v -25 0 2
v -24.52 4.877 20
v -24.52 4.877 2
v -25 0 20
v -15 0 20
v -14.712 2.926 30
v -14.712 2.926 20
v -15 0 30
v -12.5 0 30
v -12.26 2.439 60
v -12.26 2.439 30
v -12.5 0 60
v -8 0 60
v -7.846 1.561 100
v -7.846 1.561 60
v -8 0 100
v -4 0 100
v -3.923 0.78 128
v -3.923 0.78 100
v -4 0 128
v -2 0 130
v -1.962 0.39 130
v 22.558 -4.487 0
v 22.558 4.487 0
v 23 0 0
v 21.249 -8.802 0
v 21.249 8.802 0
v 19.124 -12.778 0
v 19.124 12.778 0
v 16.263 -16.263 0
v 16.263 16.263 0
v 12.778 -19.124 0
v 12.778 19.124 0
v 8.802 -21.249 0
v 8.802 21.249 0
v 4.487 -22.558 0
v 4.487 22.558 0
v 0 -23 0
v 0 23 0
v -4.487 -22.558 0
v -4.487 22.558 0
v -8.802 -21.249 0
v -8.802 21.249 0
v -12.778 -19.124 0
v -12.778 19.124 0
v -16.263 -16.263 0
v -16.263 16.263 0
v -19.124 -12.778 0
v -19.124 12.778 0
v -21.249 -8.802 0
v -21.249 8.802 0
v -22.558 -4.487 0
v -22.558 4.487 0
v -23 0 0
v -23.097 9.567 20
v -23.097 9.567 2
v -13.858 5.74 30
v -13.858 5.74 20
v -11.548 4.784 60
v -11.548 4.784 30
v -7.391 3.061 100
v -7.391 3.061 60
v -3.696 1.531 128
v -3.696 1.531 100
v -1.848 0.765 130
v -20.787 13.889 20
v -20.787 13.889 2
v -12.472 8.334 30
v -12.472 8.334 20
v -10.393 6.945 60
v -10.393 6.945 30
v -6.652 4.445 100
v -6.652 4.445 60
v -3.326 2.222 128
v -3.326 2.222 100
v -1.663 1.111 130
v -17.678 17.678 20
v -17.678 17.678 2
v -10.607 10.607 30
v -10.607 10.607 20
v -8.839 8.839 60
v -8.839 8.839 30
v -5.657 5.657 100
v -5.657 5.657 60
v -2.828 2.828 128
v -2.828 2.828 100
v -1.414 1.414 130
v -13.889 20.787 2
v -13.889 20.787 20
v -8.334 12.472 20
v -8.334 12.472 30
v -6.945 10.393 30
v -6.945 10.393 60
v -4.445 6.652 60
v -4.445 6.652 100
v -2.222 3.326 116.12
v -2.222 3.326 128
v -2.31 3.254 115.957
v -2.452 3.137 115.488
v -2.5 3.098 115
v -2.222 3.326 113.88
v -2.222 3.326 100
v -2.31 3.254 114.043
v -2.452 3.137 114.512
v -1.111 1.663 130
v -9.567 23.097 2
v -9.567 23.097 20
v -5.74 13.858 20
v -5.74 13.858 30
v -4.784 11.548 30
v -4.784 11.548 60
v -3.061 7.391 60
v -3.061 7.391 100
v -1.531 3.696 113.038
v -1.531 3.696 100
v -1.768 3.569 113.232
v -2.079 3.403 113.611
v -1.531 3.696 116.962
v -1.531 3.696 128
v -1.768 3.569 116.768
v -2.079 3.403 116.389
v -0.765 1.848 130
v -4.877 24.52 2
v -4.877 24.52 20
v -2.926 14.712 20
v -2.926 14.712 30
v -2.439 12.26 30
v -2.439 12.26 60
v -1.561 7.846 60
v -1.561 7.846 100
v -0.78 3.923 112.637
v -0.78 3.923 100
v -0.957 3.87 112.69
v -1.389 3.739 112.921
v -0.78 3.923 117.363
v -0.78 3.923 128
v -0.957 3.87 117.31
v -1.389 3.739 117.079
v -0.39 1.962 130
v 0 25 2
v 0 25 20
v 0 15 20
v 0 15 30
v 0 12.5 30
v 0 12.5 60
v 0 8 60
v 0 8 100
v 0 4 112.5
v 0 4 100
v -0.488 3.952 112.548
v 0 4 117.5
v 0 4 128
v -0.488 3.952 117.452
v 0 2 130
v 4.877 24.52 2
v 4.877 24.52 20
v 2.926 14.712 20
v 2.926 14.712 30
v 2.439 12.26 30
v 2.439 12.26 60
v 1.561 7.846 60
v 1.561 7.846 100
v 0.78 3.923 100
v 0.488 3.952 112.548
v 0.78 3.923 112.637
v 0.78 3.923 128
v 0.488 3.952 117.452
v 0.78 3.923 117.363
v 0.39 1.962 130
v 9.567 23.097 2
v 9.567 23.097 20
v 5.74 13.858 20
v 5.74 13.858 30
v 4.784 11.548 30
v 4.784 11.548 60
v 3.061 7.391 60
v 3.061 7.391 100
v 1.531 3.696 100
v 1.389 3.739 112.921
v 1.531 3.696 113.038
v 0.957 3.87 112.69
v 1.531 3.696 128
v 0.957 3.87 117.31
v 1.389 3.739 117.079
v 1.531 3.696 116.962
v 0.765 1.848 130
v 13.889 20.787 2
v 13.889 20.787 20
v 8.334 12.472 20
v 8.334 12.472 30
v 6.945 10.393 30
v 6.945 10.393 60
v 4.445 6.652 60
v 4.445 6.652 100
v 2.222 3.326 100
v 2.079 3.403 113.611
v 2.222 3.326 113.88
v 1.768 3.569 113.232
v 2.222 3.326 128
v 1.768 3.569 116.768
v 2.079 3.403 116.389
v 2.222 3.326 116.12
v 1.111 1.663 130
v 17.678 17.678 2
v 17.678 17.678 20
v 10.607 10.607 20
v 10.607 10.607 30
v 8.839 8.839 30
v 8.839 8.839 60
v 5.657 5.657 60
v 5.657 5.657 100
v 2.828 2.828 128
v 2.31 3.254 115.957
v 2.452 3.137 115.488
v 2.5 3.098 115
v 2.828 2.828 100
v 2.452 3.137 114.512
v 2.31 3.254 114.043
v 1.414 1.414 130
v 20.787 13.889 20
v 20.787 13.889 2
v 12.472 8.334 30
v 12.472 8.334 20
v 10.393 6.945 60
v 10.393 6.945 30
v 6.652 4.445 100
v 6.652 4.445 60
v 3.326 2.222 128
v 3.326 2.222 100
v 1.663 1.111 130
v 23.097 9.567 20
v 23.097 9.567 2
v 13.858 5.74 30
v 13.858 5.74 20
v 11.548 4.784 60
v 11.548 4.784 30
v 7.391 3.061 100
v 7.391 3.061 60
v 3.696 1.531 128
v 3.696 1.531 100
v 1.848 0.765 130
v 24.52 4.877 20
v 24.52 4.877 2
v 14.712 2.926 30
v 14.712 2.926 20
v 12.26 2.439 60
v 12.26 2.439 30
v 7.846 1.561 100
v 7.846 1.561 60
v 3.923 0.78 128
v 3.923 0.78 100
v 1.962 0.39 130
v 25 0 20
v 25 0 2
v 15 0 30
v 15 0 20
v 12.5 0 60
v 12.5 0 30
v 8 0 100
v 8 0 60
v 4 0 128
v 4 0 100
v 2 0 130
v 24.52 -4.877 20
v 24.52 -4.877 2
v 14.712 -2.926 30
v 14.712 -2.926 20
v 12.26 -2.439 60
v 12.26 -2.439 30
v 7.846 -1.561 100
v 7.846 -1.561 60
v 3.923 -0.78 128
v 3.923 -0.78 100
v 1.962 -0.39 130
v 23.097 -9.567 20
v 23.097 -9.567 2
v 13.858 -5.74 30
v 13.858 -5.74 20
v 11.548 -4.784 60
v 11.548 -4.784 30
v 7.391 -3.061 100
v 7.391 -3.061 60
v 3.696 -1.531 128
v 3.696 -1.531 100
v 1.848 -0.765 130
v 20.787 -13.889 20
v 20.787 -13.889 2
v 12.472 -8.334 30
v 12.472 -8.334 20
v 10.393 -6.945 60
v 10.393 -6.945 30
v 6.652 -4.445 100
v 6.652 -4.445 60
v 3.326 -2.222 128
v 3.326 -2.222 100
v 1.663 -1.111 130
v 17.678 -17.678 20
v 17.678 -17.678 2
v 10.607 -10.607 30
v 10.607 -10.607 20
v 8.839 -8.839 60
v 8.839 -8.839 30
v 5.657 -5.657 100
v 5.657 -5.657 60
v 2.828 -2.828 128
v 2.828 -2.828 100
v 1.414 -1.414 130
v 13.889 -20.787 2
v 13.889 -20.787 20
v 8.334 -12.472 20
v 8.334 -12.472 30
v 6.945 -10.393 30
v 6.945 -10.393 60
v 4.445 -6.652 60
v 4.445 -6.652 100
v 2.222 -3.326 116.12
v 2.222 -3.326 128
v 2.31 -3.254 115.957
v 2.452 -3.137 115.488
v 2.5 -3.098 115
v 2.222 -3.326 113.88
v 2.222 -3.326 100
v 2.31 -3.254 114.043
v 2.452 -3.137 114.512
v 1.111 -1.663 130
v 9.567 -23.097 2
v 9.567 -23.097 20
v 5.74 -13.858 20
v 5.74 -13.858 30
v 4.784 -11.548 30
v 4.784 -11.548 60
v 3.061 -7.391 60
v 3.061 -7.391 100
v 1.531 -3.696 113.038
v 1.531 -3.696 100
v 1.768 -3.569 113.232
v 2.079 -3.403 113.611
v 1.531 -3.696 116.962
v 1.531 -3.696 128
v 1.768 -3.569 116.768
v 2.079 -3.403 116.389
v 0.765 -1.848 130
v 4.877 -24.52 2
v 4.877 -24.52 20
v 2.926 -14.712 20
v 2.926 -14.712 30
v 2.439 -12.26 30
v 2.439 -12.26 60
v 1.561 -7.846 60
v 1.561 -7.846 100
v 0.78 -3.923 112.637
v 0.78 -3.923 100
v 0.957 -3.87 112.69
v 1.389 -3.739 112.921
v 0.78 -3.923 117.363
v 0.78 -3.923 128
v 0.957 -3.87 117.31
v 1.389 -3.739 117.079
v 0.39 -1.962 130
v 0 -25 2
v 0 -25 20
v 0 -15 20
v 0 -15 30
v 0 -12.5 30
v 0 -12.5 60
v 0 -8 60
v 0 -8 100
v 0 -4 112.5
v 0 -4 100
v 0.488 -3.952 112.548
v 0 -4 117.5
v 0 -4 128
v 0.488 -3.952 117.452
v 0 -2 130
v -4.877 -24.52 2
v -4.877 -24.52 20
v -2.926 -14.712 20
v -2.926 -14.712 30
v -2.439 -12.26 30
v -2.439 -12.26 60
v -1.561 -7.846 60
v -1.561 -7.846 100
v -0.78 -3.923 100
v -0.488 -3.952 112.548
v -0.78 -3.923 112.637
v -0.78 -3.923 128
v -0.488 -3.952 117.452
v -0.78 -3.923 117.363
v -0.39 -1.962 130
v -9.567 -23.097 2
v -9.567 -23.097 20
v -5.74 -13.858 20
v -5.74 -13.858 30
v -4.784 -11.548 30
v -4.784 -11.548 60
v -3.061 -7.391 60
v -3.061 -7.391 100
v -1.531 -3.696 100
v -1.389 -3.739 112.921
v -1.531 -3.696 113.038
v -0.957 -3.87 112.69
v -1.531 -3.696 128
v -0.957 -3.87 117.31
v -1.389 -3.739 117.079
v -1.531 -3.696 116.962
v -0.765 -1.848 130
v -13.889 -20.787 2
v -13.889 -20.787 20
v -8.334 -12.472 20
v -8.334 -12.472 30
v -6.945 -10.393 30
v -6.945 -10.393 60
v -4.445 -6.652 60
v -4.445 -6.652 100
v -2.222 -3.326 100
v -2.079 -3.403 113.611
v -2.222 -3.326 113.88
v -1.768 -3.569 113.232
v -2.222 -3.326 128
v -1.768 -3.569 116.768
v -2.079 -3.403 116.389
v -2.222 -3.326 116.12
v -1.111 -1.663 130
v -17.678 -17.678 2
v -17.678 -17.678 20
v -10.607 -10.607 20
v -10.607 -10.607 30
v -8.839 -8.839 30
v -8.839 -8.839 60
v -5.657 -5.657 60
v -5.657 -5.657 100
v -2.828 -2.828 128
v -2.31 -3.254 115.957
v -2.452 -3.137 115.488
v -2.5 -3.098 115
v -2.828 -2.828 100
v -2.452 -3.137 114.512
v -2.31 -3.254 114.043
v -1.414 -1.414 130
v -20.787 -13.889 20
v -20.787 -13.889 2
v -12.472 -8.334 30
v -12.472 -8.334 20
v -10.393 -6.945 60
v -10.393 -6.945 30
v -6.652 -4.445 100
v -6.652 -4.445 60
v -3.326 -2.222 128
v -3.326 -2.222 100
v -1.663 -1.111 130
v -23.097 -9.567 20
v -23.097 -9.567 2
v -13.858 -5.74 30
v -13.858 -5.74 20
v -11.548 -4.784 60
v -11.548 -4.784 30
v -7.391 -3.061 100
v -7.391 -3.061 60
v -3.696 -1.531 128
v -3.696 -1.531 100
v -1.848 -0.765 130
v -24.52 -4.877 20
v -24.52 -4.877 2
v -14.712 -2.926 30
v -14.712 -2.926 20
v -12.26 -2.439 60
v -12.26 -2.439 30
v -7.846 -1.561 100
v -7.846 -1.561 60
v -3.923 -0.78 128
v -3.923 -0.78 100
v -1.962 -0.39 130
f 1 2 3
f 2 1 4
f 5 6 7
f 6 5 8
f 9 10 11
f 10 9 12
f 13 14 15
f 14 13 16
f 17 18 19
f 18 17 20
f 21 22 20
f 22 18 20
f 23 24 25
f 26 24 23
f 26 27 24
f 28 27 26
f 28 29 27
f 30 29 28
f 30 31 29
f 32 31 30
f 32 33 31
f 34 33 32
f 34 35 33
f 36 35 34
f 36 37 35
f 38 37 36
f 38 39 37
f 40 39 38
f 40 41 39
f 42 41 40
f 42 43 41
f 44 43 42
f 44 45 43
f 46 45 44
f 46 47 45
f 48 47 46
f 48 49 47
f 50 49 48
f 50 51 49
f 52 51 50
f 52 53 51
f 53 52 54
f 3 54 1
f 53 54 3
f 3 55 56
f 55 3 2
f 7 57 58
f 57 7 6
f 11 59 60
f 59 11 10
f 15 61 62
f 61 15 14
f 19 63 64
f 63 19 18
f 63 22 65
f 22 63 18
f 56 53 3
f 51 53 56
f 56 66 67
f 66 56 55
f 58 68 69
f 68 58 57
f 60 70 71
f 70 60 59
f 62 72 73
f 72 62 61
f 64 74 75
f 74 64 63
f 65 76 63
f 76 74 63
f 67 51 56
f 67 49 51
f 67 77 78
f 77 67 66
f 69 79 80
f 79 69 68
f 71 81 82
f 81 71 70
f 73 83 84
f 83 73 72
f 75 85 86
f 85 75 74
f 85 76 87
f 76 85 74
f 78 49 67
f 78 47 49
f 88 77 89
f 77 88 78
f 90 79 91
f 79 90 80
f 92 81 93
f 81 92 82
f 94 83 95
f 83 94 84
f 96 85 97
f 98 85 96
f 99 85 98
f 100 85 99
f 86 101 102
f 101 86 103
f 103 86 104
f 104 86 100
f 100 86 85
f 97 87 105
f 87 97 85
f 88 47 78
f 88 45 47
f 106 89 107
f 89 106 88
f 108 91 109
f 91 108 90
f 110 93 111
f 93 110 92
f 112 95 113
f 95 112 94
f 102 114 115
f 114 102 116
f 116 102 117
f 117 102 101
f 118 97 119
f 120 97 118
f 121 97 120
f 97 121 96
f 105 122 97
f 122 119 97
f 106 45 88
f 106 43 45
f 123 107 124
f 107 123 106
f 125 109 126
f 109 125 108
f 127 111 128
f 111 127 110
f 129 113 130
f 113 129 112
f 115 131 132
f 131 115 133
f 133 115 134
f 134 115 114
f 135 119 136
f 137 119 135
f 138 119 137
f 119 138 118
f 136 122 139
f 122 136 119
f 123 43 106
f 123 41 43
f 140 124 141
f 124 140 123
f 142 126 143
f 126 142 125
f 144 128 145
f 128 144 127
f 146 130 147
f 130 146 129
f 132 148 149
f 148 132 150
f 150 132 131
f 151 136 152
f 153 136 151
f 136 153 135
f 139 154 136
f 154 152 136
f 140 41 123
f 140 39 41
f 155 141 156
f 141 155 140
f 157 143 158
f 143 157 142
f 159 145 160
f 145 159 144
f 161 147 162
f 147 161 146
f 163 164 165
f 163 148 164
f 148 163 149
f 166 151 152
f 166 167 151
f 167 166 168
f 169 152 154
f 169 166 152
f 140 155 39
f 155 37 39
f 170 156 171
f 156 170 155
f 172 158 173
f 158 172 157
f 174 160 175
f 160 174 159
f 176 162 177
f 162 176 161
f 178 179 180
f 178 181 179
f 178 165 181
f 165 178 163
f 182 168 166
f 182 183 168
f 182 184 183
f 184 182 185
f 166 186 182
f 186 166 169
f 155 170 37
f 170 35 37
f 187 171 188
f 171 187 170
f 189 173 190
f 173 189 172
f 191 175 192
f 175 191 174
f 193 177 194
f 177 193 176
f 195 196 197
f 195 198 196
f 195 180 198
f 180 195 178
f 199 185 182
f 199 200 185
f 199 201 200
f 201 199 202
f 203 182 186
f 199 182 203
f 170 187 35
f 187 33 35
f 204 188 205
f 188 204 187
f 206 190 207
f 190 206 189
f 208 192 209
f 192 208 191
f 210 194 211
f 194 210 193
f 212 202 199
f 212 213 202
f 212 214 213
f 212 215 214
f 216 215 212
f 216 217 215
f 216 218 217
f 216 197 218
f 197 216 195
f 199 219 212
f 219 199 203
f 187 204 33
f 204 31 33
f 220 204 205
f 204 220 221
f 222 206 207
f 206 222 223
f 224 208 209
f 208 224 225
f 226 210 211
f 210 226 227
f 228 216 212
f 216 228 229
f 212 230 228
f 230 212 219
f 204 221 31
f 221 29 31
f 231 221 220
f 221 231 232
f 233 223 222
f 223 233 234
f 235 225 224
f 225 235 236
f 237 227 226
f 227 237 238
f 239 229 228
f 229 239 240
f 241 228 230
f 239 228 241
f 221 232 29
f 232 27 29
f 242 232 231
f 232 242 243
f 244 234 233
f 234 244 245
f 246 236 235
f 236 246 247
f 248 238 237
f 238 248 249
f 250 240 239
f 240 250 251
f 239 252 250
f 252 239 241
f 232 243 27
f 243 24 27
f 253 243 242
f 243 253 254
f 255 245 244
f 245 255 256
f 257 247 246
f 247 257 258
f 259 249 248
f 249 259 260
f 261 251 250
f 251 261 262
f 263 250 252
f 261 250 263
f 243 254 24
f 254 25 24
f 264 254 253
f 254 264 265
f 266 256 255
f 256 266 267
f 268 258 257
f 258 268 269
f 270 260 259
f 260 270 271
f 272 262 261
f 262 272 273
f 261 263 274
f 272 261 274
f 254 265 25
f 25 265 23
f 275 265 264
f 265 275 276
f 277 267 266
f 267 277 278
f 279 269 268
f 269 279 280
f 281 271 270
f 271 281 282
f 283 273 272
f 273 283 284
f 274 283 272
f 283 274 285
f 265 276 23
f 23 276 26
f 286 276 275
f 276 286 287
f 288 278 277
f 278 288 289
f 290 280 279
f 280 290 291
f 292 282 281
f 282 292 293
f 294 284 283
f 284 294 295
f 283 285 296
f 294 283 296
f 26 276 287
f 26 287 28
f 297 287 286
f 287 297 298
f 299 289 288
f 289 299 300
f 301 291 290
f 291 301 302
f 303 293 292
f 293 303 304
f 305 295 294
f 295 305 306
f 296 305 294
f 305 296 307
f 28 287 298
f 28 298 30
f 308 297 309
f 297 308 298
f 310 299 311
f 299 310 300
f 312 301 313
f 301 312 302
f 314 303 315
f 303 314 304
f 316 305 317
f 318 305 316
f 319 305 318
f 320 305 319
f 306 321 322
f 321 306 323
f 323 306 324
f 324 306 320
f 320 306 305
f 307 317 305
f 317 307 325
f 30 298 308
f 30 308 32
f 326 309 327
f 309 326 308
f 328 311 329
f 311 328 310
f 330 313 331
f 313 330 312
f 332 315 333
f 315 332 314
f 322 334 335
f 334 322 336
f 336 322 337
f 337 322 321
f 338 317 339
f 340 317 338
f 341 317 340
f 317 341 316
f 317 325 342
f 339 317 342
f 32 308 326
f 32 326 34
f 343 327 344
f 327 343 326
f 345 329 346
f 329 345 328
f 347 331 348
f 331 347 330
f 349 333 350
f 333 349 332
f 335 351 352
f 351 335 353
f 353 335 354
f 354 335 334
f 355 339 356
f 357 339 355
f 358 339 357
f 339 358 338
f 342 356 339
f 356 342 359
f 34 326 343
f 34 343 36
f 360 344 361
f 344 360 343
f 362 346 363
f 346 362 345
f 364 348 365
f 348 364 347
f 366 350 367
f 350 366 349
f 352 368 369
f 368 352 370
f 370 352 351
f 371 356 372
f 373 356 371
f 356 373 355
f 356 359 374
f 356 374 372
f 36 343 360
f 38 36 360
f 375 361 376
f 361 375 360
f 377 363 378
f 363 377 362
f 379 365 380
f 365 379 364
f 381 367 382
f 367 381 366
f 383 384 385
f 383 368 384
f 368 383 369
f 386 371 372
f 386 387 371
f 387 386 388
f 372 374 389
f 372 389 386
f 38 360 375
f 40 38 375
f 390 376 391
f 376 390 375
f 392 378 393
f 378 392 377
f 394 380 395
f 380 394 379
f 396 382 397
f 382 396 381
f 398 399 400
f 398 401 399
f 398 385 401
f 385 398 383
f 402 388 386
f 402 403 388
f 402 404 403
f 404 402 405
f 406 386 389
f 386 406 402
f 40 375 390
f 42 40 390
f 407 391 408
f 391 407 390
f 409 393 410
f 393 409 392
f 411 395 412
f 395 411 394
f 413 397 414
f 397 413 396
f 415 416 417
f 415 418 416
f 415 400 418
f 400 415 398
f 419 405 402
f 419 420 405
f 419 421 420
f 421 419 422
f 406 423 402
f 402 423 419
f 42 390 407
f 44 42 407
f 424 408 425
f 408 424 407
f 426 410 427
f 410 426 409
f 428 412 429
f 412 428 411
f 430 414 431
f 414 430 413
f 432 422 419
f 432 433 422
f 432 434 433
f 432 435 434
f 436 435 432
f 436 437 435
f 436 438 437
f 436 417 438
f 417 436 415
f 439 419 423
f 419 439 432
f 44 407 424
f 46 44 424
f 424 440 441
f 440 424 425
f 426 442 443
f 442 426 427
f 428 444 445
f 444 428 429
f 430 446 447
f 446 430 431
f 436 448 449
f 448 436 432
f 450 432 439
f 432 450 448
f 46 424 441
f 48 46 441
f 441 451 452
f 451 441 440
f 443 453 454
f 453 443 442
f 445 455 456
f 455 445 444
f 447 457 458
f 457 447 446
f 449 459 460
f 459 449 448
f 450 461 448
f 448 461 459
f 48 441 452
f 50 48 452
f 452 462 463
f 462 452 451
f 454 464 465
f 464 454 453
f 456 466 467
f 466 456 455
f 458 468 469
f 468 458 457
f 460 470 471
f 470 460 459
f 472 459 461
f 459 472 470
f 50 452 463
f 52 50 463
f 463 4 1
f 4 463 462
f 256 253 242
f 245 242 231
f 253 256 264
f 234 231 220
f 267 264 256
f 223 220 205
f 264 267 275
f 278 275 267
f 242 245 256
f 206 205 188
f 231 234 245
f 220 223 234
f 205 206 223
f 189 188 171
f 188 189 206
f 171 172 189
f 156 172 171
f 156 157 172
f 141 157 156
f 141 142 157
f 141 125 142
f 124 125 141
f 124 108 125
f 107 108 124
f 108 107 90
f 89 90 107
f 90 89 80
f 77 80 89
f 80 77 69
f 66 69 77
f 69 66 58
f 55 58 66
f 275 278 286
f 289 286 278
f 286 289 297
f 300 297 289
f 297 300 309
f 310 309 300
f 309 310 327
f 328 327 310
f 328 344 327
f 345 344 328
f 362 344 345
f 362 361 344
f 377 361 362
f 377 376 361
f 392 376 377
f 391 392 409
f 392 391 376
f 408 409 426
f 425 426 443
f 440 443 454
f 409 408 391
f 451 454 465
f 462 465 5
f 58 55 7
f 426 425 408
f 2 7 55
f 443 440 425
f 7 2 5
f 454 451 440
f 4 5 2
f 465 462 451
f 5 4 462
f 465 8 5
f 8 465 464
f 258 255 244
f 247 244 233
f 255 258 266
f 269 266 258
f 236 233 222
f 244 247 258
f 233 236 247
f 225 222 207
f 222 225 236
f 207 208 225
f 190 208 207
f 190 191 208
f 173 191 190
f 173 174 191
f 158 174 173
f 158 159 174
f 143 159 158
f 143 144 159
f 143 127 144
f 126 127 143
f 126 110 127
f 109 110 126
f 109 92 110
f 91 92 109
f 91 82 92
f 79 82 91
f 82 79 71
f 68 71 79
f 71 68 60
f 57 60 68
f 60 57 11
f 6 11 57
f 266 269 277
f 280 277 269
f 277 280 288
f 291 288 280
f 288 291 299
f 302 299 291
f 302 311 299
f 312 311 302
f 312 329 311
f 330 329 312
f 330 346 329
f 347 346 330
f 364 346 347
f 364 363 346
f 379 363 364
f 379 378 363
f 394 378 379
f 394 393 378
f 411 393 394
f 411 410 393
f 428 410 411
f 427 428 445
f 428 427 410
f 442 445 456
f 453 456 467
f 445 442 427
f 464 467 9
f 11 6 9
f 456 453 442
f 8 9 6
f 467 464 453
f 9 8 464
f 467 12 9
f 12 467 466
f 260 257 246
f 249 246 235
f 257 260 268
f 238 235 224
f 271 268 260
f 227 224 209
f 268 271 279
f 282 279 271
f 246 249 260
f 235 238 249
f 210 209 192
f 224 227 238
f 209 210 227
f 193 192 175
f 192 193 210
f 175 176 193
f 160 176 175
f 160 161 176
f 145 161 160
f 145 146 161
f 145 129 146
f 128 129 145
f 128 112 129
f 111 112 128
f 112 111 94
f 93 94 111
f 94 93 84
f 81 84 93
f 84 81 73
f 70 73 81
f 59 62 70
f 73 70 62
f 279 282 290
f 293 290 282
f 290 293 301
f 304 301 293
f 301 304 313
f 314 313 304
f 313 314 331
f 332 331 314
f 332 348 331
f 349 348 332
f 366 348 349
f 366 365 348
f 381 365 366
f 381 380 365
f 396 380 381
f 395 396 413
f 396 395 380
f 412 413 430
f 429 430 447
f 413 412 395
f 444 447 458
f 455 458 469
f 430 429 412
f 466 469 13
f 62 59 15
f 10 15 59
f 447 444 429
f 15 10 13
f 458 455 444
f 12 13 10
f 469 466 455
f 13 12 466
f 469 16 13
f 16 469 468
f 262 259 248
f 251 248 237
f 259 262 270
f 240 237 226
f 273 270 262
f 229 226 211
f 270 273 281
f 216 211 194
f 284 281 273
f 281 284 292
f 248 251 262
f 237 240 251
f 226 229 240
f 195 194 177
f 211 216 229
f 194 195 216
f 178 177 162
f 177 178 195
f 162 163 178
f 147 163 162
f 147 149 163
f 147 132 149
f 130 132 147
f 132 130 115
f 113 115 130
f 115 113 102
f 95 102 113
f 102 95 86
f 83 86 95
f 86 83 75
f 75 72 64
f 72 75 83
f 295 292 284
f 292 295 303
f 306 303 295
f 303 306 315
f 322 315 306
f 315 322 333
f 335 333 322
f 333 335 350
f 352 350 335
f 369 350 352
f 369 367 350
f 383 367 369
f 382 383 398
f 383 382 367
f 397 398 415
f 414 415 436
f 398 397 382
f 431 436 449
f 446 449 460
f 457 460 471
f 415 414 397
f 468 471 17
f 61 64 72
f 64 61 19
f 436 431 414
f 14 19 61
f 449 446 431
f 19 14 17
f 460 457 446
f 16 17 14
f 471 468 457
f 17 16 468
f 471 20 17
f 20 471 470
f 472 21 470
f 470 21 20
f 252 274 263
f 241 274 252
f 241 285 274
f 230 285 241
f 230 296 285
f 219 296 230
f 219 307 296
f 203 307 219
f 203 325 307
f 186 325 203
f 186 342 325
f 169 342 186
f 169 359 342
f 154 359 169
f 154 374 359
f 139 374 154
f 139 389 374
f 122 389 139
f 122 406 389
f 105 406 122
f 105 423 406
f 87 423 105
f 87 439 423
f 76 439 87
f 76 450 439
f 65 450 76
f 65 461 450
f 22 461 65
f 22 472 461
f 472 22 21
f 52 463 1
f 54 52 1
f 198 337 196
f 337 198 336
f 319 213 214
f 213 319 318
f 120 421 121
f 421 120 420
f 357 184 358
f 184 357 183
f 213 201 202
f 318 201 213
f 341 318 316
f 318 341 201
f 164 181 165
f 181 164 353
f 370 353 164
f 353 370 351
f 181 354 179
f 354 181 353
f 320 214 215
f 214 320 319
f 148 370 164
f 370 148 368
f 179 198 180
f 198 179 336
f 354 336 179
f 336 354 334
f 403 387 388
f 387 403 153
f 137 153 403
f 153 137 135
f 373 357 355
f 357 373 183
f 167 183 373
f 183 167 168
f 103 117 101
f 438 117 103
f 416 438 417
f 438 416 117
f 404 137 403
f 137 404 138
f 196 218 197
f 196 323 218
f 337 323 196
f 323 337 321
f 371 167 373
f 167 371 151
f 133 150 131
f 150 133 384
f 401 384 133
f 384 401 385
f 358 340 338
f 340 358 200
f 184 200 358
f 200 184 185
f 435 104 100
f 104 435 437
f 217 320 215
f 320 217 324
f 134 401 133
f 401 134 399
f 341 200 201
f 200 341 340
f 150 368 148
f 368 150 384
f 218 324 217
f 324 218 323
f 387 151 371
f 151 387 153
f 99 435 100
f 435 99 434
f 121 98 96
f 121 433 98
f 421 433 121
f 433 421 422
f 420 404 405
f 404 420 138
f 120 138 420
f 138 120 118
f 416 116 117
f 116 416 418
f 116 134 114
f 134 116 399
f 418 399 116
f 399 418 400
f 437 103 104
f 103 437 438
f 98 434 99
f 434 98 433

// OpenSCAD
$fn = 32;

// ----------------------------------------------------------------------
// Stepped shaft: diameters 50, 30, 25, 16, 8 mm, 130 mm long
// ----------------------------------------------------------------------

// --- parameters (mm) ---
d1 = 50;                  // step 1 diameter
len1 = 20;                // step 1 length
d2 = 30;                  // step 2 diameter
len2 = 10;                // step 2 length
d3 = 25;                  // step 3 diameter
len3 = 30;                // step 3 length
d4 = 16;                  // step 4 diameter
len4 = 40;                // step 4 length
d5 = 8;                   // step 5 diameter
len5 = 30;                // step 5 length
total = 130;              // overall length
chamfer = 2;              // end chamfer
key_w = 4;                // keyway width
key_d = 2;                // keyway depth
key_len = 14;             // keyway length
key_z = 113;              // keyway start along the shaft
cross_d = 5;              // cross pin hole
cross_z = 115;            // cross hole position

/* closed turning profile: x is the radius, y is the length */
profile = [[0, 0], [25 - chamfer, 0], [25, chamfer], [25, 20], [15, 20], [15, 30], [12.5, 30], [12.5, 60], [8, 60], [8, 100], [4, 100], [4, 128], [2, 130], [0, 130]];

difference() {
  rotate_extrude() polygon(profile);
  /* keyway milled into the top of the largest step */
  translate([d1 / 2 - key_d, -key_w / 2, key_z]) cube([key_d + 1, key_w, key_len]);
  /* cross pin hole through the small step */
  translate([0, 0, cross_z]) rotate([90, 0, 0]) cylinder(h = d5 + 4, d = cross_d, center = true);
}
